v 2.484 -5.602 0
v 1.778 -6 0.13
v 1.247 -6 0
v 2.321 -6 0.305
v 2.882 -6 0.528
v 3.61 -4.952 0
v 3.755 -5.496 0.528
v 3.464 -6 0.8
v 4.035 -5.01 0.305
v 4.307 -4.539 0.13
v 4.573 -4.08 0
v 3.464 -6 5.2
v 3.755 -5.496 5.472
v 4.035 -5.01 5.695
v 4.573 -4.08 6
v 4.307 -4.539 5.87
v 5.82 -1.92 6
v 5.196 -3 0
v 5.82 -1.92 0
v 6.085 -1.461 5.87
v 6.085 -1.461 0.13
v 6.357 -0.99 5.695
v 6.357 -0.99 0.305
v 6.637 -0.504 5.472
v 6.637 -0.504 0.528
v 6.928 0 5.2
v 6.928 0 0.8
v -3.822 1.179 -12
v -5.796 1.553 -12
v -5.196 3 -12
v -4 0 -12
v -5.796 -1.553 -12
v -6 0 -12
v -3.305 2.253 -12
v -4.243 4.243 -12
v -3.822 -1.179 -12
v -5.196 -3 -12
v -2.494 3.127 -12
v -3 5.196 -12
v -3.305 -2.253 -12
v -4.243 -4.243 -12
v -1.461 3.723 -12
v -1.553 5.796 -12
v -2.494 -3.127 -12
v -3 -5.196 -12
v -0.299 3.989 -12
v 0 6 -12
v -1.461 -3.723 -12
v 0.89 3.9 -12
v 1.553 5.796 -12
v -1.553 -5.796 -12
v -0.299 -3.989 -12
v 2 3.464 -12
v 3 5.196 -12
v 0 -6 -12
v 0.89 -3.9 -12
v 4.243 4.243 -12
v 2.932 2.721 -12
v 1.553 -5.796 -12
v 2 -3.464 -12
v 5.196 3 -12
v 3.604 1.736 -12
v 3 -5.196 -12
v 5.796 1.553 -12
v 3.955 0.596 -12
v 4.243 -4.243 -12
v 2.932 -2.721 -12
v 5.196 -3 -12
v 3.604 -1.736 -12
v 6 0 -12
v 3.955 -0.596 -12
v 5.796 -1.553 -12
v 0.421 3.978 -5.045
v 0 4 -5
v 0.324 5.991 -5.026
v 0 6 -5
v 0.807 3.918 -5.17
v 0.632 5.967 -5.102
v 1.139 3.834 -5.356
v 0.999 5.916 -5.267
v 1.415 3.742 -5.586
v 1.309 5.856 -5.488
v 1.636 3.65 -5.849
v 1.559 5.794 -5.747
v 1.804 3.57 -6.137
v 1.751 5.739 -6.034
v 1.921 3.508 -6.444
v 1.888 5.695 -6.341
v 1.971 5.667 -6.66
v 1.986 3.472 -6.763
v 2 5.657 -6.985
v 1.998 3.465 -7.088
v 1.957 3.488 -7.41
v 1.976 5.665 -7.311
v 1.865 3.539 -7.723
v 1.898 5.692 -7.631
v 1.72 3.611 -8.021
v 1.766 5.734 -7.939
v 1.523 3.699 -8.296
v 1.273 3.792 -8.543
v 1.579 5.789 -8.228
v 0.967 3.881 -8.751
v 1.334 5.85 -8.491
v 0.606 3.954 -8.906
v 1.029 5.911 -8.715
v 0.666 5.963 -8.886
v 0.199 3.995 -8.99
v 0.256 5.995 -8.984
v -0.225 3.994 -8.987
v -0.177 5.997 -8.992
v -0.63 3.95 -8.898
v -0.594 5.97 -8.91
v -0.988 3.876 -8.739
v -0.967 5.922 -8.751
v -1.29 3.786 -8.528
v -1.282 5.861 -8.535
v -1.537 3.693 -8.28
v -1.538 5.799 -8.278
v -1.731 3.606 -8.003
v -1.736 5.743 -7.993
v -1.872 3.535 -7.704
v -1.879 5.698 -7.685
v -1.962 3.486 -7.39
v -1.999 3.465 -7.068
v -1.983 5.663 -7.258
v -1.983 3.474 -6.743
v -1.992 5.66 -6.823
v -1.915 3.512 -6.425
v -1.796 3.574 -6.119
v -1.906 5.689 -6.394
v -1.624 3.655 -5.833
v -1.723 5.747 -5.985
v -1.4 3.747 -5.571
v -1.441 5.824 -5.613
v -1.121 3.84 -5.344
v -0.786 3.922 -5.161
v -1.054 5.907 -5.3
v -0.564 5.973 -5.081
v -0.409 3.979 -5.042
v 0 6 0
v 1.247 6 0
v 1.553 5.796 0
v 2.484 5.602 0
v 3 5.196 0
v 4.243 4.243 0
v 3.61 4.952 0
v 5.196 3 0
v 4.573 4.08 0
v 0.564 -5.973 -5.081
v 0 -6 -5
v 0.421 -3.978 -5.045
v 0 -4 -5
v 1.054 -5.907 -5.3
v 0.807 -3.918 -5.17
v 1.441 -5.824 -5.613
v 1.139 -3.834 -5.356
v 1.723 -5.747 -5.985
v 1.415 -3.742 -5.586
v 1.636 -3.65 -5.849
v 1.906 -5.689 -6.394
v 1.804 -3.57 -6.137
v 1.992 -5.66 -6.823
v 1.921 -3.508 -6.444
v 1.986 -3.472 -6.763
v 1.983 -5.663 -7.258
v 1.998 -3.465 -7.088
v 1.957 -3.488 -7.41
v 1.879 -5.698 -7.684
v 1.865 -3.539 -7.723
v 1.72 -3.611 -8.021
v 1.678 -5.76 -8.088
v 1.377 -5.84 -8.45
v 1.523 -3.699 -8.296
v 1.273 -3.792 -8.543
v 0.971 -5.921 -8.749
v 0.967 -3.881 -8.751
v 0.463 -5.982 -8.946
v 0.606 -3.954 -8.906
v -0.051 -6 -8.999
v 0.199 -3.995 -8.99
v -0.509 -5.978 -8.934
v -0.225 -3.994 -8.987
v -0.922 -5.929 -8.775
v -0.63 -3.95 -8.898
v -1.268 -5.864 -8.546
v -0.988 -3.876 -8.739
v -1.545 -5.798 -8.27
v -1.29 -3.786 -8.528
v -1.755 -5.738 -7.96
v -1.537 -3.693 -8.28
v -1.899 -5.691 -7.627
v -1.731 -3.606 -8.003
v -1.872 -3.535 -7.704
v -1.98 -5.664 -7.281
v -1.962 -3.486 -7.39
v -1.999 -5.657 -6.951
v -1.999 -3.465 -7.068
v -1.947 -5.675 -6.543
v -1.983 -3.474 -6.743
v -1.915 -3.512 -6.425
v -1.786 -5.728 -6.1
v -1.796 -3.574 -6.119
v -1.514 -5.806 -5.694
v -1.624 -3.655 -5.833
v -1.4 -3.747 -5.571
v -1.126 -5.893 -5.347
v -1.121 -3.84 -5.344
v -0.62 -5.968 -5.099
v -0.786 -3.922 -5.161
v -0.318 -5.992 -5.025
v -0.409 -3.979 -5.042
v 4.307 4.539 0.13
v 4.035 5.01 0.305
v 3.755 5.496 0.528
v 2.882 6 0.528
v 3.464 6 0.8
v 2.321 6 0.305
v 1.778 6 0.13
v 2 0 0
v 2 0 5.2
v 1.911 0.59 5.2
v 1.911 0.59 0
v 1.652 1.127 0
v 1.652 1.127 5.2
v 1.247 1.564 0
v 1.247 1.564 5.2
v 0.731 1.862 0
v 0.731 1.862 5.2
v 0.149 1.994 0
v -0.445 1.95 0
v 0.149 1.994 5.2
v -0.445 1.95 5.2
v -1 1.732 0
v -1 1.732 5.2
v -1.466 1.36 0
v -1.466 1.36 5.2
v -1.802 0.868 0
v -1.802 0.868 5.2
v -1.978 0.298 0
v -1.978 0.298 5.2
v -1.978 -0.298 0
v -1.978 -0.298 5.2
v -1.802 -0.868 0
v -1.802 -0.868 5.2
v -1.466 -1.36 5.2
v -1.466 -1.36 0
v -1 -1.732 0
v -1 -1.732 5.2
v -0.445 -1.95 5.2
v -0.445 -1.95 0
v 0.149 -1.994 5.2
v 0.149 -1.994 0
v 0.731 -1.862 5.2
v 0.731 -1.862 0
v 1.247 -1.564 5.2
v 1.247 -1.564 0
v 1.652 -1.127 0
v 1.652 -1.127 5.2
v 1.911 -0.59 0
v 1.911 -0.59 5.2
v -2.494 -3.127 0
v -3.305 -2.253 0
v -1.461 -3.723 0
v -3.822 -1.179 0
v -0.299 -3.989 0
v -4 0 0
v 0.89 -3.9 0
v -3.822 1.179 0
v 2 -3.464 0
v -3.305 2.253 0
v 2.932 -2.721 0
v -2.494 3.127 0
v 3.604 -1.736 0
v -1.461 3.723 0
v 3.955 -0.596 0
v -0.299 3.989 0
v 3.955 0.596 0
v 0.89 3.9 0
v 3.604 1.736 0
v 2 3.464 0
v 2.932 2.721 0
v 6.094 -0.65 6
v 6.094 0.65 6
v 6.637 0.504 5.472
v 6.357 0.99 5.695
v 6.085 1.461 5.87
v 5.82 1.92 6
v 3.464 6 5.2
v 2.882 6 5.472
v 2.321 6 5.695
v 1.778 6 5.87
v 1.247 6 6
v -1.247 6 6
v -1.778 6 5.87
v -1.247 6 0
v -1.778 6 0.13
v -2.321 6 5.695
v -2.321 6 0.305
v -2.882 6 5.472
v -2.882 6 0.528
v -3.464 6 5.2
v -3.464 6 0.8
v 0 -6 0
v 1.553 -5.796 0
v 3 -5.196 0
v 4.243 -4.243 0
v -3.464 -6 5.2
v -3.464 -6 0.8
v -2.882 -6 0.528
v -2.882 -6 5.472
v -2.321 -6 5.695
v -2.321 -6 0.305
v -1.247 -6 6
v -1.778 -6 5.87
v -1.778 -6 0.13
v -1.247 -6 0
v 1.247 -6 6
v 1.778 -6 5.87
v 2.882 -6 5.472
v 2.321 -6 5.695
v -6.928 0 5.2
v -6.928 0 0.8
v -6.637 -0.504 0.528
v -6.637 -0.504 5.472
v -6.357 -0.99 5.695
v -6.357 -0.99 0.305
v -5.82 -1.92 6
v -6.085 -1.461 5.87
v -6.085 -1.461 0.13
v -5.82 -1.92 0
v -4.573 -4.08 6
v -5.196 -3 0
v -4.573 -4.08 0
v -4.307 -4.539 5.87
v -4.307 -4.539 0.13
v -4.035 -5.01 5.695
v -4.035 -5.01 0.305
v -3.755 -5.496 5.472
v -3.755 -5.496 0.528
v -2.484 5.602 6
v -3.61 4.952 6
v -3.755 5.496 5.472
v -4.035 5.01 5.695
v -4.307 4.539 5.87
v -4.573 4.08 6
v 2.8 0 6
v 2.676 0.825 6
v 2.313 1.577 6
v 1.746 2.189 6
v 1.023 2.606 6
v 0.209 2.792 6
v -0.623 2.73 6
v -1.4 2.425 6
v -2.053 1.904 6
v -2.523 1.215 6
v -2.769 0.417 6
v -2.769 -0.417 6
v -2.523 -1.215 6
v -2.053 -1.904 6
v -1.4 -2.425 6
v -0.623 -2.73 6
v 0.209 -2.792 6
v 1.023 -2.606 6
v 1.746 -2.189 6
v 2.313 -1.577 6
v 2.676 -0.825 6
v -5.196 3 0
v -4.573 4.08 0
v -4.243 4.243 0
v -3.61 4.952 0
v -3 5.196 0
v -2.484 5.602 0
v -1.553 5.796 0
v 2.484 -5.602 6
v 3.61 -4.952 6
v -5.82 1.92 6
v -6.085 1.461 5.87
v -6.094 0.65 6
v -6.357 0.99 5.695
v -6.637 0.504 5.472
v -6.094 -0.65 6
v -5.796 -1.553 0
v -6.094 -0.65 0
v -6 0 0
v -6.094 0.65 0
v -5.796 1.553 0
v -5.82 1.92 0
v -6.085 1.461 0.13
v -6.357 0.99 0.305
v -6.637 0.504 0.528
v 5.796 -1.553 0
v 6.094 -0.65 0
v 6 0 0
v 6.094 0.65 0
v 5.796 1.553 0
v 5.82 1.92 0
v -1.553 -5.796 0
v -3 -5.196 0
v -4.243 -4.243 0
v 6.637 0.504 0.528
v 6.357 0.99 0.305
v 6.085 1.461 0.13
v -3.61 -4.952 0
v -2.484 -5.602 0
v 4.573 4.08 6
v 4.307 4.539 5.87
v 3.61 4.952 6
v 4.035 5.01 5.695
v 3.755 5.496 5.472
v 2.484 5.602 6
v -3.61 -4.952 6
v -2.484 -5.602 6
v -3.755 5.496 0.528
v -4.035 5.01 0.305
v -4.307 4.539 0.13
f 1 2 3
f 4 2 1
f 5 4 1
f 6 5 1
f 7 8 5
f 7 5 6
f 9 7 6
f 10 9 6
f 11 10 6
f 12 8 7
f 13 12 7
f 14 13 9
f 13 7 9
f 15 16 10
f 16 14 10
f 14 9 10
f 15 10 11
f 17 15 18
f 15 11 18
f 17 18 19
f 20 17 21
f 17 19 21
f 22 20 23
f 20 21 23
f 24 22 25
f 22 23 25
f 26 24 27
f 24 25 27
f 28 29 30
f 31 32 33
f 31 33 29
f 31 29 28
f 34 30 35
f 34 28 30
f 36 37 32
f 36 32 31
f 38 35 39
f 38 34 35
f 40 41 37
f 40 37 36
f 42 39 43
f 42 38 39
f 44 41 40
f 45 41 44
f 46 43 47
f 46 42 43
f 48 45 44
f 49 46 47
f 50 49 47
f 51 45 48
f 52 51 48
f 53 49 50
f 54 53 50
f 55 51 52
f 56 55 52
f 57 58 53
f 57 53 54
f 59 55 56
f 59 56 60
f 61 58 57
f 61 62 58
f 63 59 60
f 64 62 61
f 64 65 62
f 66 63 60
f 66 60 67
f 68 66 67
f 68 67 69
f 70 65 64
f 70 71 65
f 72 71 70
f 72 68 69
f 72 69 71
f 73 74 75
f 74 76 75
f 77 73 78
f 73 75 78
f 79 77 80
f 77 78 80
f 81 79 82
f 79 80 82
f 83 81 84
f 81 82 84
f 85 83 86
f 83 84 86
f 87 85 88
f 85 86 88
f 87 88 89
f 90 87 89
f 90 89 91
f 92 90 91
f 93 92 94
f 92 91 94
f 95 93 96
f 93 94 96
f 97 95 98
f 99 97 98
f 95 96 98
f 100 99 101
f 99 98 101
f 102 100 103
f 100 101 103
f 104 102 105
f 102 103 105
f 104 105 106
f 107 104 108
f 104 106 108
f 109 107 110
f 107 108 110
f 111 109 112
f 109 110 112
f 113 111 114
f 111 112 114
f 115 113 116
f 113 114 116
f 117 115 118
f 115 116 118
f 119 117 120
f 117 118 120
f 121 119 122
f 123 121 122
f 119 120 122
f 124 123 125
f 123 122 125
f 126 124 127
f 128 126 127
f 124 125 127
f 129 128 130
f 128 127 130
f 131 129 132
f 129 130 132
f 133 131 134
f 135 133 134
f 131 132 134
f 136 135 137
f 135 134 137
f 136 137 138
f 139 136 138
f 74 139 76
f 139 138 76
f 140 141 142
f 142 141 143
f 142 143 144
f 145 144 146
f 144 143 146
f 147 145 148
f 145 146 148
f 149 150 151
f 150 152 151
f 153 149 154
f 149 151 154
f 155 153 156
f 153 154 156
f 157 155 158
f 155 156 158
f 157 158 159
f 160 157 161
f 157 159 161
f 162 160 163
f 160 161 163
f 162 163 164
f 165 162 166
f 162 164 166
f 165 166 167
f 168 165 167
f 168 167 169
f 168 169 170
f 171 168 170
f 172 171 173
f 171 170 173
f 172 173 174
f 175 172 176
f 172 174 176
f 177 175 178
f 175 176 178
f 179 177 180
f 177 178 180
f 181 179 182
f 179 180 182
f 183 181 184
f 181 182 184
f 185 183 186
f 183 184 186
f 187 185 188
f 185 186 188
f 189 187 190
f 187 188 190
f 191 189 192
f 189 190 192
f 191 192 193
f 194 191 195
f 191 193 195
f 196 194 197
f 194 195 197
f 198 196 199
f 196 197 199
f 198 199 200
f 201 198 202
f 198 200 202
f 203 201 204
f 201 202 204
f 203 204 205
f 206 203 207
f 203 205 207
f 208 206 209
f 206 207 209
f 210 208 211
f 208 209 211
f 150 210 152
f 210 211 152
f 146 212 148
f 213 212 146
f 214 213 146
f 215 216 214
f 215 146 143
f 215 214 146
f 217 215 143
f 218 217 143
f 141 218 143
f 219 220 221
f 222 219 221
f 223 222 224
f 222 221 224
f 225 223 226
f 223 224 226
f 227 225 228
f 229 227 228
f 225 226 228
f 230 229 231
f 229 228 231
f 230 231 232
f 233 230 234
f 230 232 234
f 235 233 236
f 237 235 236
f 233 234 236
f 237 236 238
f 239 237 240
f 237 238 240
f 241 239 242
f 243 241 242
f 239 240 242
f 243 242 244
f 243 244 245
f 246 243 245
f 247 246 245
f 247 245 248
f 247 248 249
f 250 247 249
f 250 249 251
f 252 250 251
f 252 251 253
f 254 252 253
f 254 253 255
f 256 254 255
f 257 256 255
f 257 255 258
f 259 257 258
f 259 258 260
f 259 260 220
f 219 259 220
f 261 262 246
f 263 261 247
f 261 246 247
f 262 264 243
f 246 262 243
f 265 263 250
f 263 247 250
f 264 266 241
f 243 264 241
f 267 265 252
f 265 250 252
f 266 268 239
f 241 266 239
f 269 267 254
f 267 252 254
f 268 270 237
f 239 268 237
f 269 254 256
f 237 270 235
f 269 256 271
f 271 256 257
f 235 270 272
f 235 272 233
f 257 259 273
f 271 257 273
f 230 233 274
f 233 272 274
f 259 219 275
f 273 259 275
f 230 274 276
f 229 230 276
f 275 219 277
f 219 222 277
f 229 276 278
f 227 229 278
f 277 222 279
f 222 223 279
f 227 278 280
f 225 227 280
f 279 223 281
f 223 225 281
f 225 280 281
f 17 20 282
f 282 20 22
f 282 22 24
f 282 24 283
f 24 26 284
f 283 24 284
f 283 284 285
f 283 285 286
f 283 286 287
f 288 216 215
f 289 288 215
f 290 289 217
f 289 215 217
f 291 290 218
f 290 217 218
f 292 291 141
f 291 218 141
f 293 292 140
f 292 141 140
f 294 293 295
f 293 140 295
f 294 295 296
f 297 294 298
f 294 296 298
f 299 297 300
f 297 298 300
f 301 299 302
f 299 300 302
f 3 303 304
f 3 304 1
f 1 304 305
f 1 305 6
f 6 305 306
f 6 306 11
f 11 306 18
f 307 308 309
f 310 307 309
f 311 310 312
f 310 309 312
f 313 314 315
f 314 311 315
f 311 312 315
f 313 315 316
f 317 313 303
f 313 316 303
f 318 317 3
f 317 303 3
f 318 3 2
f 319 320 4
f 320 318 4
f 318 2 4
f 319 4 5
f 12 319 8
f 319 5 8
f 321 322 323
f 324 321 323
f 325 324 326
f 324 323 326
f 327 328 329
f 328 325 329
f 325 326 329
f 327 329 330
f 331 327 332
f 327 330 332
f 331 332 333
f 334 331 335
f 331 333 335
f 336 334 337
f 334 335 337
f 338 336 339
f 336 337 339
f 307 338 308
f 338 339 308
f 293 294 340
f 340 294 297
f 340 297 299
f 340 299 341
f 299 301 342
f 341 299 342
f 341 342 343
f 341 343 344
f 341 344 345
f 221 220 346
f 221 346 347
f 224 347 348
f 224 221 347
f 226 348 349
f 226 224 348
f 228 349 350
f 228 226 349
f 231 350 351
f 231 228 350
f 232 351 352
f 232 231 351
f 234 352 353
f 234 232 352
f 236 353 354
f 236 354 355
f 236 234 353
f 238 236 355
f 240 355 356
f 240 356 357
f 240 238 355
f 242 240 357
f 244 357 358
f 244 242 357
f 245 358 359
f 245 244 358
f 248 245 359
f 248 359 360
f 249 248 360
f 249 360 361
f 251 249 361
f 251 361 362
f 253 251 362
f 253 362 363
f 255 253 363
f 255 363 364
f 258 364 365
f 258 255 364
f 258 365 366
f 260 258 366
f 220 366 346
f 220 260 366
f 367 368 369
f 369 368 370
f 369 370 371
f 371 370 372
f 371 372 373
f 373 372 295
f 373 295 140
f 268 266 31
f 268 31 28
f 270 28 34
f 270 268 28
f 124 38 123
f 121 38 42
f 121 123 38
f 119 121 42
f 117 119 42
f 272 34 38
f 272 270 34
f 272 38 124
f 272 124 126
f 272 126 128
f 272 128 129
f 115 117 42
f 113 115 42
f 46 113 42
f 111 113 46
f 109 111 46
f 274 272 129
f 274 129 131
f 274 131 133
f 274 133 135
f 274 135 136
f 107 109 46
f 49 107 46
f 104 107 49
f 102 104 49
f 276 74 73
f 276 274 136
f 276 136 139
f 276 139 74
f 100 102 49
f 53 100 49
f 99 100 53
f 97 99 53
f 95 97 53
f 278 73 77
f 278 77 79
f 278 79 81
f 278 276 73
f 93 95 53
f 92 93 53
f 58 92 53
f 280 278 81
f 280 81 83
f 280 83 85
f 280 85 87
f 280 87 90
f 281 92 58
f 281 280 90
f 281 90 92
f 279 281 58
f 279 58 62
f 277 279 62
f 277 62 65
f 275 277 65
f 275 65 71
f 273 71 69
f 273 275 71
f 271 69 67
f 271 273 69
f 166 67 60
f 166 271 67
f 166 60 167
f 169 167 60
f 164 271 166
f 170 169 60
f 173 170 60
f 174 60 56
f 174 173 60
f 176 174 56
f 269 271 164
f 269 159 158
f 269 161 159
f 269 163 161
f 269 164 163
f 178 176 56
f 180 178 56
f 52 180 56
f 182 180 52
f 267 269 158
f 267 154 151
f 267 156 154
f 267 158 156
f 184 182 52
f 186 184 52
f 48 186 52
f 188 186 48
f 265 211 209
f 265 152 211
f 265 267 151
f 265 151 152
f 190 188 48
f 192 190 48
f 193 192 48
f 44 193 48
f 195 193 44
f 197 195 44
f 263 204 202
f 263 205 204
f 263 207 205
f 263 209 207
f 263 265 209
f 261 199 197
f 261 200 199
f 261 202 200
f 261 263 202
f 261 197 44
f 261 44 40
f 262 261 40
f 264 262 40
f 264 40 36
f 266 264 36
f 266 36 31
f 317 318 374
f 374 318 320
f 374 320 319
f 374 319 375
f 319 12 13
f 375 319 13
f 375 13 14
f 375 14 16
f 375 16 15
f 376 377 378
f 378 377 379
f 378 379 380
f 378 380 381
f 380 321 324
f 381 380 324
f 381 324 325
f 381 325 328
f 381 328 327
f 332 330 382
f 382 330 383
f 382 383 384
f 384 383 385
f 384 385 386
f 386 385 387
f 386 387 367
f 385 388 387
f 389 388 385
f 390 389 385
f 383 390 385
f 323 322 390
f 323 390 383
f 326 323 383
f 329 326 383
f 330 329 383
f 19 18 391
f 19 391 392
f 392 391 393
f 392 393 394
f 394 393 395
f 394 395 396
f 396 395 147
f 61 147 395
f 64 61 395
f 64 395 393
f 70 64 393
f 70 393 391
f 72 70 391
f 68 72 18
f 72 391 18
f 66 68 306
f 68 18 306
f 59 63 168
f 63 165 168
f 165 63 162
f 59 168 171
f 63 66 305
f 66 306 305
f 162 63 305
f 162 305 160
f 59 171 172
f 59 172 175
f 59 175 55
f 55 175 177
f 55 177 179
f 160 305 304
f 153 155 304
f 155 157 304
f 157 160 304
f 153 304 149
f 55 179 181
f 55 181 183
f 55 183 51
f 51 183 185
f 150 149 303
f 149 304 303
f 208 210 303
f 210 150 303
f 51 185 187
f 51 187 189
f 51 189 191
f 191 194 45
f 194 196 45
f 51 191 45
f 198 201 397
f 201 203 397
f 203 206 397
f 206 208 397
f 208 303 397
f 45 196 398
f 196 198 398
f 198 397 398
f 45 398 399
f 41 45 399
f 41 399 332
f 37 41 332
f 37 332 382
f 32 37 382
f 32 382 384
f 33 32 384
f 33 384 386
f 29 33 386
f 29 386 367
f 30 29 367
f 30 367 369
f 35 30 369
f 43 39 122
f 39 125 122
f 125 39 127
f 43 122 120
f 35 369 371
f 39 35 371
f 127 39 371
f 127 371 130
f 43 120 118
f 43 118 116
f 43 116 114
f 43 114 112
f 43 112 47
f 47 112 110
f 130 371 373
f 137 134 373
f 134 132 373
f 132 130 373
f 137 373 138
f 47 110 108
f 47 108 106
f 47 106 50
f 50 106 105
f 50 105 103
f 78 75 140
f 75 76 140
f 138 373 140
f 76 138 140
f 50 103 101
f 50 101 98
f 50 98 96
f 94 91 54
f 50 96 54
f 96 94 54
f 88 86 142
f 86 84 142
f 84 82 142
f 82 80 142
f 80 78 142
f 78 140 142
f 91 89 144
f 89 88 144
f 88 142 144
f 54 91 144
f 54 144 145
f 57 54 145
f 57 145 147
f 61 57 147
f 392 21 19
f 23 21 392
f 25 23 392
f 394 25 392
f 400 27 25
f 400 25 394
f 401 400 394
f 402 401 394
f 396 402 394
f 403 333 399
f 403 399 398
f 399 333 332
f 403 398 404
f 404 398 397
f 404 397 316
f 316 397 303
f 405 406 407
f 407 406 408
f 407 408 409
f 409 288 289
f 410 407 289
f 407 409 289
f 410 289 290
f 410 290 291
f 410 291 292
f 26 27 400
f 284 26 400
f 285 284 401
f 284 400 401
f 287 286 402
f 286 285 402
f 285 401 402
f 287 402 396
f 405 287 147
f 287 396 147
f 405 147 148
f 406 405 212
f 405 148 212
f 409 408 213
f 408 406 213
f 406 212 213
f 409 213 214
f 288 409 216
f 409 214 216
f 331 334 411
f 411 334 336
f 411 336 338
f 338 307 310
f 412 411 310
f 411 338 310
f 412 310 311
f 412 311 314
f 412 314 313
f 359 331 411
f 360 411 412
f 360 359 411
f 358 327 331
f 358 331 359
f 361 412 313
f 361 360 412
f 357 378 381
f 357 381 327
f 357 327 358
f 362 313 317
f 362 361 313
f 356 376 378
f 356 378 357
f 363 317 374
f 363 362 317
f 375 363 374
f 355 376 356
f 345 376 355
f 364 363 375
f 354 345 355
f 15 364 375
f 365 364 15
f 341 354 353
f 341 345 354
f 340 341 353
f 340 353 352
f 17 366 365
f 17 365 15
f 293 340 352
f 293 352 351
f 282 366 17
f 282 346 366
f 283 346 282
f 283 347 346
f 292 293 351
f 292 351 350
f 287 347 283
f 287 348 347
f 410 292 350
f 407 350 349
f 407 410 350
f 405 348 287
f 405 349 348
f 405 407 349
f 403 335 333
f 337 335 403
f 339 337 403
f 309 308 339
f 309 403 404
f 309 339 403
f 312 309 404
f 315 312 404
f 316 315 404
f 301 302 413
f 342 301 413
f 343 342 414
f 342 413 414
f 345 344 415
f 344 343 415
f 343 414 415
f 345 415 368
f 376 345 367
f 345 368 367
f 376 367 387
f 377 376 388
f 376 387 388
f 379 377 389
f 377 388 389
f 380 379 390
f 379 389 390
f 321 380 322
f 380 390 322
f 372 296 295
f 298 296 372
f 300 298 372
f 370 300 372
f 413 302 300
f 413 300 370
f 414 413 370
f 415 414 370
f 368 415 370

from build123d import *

# Parameters (mm, degrees)
EXTRUDE_1_DEPTH     = 6
SKETCH_2_R          = 6
SKETCH_2_R_2        = 4
EXTRUDE_2_DEPTH     = 12
SKETCH_3_R          = 2
CUT_EXTRUDE_1_DEPTH = 12
CHAMFER_1_SIZE      = 0.8
SKETCH_4_R          = 2
CUT_EXTRUDE_2_DEPTH = 6


with BuildPart() as part:
    # 草图1 → 凸台-拉伸1 (new body)
    with BuildSketch(Plane.XY):
        Polygon((6.92820323, 0), (3.464101615, 6), (-3.464101615, 6), (-6.92820323, 0), (-3.464101615, -6), (3.464101615, -6), align=None)
    extrude(amount=EXTRUDE_1_DEPTH)

    # 草图2 → 凸台-拉伸2 (add)
    with BuildSketch(Plane(origin=(0, 0, 0), x_dir=(-1, 0, 0), z_dir=(0, 0, -1))):
        with Locations(Location((0, 0, 0), (0, 0, 150))):
            Circle(SKETCH_2_R)
        Circle(SKETCH_2_R_2, mode=Mode.SUBTRACT)
    extrude(amount=EXTRUDE_2_DEPTH)

    # 草图3 → 切除-拉伸1 (cut)
    with BuildSketch(Plane.XY.offset(6)):
        Circle(SKETCH_3_R)
    extrude(amount=-CUT_EXTRUDE_1_DEPTH, mode=Mode.SUBTRACT)

    # 倒角1
    chamfer_1_edges = [part.edges().sort_by_distance(p)[0] for p in [
        (-2, 0, 6),
    ]]
    chamfer(chamfer_1_edges, length=CHAMFER_1_SIZE)

    # 草图4 → 切除-拉伸2 (cut, symmetric)
    with BuildSketch(Plane(origin=(0, 0, 0), x_dir=(1, 0, 0), z_dir=(0, 1, 0))):
        with Locations(Location((0, 7, 0), (0, 0, 270))):
            Circle(SKETCH_4_R)
    extrude(amount=CUT_EXTRUDE_2_DEPTH, both=True, mode=Mode.SUBTRACT)

    # 草图5 → 切除-旋转1 (revolve, cut)
    with BuildSketch(Plane(origin=(0, 0, 0), x_dir=(1, 0, 0), z_dir=(0, 1, 0))):
        Polygon((-6.92820323, 0), (-6.12820323, 0), (-6.92820323, -0.8), align=None)
        Polygon((-6.92820323, -5.2), (-6.92820323, -6), (-6.12820323, -6), align=None)
    revolve(axis=Axis((0, 0, 0), (0, 0, 1)), mode=Mode.SUBTRACT)


solid = part.part
